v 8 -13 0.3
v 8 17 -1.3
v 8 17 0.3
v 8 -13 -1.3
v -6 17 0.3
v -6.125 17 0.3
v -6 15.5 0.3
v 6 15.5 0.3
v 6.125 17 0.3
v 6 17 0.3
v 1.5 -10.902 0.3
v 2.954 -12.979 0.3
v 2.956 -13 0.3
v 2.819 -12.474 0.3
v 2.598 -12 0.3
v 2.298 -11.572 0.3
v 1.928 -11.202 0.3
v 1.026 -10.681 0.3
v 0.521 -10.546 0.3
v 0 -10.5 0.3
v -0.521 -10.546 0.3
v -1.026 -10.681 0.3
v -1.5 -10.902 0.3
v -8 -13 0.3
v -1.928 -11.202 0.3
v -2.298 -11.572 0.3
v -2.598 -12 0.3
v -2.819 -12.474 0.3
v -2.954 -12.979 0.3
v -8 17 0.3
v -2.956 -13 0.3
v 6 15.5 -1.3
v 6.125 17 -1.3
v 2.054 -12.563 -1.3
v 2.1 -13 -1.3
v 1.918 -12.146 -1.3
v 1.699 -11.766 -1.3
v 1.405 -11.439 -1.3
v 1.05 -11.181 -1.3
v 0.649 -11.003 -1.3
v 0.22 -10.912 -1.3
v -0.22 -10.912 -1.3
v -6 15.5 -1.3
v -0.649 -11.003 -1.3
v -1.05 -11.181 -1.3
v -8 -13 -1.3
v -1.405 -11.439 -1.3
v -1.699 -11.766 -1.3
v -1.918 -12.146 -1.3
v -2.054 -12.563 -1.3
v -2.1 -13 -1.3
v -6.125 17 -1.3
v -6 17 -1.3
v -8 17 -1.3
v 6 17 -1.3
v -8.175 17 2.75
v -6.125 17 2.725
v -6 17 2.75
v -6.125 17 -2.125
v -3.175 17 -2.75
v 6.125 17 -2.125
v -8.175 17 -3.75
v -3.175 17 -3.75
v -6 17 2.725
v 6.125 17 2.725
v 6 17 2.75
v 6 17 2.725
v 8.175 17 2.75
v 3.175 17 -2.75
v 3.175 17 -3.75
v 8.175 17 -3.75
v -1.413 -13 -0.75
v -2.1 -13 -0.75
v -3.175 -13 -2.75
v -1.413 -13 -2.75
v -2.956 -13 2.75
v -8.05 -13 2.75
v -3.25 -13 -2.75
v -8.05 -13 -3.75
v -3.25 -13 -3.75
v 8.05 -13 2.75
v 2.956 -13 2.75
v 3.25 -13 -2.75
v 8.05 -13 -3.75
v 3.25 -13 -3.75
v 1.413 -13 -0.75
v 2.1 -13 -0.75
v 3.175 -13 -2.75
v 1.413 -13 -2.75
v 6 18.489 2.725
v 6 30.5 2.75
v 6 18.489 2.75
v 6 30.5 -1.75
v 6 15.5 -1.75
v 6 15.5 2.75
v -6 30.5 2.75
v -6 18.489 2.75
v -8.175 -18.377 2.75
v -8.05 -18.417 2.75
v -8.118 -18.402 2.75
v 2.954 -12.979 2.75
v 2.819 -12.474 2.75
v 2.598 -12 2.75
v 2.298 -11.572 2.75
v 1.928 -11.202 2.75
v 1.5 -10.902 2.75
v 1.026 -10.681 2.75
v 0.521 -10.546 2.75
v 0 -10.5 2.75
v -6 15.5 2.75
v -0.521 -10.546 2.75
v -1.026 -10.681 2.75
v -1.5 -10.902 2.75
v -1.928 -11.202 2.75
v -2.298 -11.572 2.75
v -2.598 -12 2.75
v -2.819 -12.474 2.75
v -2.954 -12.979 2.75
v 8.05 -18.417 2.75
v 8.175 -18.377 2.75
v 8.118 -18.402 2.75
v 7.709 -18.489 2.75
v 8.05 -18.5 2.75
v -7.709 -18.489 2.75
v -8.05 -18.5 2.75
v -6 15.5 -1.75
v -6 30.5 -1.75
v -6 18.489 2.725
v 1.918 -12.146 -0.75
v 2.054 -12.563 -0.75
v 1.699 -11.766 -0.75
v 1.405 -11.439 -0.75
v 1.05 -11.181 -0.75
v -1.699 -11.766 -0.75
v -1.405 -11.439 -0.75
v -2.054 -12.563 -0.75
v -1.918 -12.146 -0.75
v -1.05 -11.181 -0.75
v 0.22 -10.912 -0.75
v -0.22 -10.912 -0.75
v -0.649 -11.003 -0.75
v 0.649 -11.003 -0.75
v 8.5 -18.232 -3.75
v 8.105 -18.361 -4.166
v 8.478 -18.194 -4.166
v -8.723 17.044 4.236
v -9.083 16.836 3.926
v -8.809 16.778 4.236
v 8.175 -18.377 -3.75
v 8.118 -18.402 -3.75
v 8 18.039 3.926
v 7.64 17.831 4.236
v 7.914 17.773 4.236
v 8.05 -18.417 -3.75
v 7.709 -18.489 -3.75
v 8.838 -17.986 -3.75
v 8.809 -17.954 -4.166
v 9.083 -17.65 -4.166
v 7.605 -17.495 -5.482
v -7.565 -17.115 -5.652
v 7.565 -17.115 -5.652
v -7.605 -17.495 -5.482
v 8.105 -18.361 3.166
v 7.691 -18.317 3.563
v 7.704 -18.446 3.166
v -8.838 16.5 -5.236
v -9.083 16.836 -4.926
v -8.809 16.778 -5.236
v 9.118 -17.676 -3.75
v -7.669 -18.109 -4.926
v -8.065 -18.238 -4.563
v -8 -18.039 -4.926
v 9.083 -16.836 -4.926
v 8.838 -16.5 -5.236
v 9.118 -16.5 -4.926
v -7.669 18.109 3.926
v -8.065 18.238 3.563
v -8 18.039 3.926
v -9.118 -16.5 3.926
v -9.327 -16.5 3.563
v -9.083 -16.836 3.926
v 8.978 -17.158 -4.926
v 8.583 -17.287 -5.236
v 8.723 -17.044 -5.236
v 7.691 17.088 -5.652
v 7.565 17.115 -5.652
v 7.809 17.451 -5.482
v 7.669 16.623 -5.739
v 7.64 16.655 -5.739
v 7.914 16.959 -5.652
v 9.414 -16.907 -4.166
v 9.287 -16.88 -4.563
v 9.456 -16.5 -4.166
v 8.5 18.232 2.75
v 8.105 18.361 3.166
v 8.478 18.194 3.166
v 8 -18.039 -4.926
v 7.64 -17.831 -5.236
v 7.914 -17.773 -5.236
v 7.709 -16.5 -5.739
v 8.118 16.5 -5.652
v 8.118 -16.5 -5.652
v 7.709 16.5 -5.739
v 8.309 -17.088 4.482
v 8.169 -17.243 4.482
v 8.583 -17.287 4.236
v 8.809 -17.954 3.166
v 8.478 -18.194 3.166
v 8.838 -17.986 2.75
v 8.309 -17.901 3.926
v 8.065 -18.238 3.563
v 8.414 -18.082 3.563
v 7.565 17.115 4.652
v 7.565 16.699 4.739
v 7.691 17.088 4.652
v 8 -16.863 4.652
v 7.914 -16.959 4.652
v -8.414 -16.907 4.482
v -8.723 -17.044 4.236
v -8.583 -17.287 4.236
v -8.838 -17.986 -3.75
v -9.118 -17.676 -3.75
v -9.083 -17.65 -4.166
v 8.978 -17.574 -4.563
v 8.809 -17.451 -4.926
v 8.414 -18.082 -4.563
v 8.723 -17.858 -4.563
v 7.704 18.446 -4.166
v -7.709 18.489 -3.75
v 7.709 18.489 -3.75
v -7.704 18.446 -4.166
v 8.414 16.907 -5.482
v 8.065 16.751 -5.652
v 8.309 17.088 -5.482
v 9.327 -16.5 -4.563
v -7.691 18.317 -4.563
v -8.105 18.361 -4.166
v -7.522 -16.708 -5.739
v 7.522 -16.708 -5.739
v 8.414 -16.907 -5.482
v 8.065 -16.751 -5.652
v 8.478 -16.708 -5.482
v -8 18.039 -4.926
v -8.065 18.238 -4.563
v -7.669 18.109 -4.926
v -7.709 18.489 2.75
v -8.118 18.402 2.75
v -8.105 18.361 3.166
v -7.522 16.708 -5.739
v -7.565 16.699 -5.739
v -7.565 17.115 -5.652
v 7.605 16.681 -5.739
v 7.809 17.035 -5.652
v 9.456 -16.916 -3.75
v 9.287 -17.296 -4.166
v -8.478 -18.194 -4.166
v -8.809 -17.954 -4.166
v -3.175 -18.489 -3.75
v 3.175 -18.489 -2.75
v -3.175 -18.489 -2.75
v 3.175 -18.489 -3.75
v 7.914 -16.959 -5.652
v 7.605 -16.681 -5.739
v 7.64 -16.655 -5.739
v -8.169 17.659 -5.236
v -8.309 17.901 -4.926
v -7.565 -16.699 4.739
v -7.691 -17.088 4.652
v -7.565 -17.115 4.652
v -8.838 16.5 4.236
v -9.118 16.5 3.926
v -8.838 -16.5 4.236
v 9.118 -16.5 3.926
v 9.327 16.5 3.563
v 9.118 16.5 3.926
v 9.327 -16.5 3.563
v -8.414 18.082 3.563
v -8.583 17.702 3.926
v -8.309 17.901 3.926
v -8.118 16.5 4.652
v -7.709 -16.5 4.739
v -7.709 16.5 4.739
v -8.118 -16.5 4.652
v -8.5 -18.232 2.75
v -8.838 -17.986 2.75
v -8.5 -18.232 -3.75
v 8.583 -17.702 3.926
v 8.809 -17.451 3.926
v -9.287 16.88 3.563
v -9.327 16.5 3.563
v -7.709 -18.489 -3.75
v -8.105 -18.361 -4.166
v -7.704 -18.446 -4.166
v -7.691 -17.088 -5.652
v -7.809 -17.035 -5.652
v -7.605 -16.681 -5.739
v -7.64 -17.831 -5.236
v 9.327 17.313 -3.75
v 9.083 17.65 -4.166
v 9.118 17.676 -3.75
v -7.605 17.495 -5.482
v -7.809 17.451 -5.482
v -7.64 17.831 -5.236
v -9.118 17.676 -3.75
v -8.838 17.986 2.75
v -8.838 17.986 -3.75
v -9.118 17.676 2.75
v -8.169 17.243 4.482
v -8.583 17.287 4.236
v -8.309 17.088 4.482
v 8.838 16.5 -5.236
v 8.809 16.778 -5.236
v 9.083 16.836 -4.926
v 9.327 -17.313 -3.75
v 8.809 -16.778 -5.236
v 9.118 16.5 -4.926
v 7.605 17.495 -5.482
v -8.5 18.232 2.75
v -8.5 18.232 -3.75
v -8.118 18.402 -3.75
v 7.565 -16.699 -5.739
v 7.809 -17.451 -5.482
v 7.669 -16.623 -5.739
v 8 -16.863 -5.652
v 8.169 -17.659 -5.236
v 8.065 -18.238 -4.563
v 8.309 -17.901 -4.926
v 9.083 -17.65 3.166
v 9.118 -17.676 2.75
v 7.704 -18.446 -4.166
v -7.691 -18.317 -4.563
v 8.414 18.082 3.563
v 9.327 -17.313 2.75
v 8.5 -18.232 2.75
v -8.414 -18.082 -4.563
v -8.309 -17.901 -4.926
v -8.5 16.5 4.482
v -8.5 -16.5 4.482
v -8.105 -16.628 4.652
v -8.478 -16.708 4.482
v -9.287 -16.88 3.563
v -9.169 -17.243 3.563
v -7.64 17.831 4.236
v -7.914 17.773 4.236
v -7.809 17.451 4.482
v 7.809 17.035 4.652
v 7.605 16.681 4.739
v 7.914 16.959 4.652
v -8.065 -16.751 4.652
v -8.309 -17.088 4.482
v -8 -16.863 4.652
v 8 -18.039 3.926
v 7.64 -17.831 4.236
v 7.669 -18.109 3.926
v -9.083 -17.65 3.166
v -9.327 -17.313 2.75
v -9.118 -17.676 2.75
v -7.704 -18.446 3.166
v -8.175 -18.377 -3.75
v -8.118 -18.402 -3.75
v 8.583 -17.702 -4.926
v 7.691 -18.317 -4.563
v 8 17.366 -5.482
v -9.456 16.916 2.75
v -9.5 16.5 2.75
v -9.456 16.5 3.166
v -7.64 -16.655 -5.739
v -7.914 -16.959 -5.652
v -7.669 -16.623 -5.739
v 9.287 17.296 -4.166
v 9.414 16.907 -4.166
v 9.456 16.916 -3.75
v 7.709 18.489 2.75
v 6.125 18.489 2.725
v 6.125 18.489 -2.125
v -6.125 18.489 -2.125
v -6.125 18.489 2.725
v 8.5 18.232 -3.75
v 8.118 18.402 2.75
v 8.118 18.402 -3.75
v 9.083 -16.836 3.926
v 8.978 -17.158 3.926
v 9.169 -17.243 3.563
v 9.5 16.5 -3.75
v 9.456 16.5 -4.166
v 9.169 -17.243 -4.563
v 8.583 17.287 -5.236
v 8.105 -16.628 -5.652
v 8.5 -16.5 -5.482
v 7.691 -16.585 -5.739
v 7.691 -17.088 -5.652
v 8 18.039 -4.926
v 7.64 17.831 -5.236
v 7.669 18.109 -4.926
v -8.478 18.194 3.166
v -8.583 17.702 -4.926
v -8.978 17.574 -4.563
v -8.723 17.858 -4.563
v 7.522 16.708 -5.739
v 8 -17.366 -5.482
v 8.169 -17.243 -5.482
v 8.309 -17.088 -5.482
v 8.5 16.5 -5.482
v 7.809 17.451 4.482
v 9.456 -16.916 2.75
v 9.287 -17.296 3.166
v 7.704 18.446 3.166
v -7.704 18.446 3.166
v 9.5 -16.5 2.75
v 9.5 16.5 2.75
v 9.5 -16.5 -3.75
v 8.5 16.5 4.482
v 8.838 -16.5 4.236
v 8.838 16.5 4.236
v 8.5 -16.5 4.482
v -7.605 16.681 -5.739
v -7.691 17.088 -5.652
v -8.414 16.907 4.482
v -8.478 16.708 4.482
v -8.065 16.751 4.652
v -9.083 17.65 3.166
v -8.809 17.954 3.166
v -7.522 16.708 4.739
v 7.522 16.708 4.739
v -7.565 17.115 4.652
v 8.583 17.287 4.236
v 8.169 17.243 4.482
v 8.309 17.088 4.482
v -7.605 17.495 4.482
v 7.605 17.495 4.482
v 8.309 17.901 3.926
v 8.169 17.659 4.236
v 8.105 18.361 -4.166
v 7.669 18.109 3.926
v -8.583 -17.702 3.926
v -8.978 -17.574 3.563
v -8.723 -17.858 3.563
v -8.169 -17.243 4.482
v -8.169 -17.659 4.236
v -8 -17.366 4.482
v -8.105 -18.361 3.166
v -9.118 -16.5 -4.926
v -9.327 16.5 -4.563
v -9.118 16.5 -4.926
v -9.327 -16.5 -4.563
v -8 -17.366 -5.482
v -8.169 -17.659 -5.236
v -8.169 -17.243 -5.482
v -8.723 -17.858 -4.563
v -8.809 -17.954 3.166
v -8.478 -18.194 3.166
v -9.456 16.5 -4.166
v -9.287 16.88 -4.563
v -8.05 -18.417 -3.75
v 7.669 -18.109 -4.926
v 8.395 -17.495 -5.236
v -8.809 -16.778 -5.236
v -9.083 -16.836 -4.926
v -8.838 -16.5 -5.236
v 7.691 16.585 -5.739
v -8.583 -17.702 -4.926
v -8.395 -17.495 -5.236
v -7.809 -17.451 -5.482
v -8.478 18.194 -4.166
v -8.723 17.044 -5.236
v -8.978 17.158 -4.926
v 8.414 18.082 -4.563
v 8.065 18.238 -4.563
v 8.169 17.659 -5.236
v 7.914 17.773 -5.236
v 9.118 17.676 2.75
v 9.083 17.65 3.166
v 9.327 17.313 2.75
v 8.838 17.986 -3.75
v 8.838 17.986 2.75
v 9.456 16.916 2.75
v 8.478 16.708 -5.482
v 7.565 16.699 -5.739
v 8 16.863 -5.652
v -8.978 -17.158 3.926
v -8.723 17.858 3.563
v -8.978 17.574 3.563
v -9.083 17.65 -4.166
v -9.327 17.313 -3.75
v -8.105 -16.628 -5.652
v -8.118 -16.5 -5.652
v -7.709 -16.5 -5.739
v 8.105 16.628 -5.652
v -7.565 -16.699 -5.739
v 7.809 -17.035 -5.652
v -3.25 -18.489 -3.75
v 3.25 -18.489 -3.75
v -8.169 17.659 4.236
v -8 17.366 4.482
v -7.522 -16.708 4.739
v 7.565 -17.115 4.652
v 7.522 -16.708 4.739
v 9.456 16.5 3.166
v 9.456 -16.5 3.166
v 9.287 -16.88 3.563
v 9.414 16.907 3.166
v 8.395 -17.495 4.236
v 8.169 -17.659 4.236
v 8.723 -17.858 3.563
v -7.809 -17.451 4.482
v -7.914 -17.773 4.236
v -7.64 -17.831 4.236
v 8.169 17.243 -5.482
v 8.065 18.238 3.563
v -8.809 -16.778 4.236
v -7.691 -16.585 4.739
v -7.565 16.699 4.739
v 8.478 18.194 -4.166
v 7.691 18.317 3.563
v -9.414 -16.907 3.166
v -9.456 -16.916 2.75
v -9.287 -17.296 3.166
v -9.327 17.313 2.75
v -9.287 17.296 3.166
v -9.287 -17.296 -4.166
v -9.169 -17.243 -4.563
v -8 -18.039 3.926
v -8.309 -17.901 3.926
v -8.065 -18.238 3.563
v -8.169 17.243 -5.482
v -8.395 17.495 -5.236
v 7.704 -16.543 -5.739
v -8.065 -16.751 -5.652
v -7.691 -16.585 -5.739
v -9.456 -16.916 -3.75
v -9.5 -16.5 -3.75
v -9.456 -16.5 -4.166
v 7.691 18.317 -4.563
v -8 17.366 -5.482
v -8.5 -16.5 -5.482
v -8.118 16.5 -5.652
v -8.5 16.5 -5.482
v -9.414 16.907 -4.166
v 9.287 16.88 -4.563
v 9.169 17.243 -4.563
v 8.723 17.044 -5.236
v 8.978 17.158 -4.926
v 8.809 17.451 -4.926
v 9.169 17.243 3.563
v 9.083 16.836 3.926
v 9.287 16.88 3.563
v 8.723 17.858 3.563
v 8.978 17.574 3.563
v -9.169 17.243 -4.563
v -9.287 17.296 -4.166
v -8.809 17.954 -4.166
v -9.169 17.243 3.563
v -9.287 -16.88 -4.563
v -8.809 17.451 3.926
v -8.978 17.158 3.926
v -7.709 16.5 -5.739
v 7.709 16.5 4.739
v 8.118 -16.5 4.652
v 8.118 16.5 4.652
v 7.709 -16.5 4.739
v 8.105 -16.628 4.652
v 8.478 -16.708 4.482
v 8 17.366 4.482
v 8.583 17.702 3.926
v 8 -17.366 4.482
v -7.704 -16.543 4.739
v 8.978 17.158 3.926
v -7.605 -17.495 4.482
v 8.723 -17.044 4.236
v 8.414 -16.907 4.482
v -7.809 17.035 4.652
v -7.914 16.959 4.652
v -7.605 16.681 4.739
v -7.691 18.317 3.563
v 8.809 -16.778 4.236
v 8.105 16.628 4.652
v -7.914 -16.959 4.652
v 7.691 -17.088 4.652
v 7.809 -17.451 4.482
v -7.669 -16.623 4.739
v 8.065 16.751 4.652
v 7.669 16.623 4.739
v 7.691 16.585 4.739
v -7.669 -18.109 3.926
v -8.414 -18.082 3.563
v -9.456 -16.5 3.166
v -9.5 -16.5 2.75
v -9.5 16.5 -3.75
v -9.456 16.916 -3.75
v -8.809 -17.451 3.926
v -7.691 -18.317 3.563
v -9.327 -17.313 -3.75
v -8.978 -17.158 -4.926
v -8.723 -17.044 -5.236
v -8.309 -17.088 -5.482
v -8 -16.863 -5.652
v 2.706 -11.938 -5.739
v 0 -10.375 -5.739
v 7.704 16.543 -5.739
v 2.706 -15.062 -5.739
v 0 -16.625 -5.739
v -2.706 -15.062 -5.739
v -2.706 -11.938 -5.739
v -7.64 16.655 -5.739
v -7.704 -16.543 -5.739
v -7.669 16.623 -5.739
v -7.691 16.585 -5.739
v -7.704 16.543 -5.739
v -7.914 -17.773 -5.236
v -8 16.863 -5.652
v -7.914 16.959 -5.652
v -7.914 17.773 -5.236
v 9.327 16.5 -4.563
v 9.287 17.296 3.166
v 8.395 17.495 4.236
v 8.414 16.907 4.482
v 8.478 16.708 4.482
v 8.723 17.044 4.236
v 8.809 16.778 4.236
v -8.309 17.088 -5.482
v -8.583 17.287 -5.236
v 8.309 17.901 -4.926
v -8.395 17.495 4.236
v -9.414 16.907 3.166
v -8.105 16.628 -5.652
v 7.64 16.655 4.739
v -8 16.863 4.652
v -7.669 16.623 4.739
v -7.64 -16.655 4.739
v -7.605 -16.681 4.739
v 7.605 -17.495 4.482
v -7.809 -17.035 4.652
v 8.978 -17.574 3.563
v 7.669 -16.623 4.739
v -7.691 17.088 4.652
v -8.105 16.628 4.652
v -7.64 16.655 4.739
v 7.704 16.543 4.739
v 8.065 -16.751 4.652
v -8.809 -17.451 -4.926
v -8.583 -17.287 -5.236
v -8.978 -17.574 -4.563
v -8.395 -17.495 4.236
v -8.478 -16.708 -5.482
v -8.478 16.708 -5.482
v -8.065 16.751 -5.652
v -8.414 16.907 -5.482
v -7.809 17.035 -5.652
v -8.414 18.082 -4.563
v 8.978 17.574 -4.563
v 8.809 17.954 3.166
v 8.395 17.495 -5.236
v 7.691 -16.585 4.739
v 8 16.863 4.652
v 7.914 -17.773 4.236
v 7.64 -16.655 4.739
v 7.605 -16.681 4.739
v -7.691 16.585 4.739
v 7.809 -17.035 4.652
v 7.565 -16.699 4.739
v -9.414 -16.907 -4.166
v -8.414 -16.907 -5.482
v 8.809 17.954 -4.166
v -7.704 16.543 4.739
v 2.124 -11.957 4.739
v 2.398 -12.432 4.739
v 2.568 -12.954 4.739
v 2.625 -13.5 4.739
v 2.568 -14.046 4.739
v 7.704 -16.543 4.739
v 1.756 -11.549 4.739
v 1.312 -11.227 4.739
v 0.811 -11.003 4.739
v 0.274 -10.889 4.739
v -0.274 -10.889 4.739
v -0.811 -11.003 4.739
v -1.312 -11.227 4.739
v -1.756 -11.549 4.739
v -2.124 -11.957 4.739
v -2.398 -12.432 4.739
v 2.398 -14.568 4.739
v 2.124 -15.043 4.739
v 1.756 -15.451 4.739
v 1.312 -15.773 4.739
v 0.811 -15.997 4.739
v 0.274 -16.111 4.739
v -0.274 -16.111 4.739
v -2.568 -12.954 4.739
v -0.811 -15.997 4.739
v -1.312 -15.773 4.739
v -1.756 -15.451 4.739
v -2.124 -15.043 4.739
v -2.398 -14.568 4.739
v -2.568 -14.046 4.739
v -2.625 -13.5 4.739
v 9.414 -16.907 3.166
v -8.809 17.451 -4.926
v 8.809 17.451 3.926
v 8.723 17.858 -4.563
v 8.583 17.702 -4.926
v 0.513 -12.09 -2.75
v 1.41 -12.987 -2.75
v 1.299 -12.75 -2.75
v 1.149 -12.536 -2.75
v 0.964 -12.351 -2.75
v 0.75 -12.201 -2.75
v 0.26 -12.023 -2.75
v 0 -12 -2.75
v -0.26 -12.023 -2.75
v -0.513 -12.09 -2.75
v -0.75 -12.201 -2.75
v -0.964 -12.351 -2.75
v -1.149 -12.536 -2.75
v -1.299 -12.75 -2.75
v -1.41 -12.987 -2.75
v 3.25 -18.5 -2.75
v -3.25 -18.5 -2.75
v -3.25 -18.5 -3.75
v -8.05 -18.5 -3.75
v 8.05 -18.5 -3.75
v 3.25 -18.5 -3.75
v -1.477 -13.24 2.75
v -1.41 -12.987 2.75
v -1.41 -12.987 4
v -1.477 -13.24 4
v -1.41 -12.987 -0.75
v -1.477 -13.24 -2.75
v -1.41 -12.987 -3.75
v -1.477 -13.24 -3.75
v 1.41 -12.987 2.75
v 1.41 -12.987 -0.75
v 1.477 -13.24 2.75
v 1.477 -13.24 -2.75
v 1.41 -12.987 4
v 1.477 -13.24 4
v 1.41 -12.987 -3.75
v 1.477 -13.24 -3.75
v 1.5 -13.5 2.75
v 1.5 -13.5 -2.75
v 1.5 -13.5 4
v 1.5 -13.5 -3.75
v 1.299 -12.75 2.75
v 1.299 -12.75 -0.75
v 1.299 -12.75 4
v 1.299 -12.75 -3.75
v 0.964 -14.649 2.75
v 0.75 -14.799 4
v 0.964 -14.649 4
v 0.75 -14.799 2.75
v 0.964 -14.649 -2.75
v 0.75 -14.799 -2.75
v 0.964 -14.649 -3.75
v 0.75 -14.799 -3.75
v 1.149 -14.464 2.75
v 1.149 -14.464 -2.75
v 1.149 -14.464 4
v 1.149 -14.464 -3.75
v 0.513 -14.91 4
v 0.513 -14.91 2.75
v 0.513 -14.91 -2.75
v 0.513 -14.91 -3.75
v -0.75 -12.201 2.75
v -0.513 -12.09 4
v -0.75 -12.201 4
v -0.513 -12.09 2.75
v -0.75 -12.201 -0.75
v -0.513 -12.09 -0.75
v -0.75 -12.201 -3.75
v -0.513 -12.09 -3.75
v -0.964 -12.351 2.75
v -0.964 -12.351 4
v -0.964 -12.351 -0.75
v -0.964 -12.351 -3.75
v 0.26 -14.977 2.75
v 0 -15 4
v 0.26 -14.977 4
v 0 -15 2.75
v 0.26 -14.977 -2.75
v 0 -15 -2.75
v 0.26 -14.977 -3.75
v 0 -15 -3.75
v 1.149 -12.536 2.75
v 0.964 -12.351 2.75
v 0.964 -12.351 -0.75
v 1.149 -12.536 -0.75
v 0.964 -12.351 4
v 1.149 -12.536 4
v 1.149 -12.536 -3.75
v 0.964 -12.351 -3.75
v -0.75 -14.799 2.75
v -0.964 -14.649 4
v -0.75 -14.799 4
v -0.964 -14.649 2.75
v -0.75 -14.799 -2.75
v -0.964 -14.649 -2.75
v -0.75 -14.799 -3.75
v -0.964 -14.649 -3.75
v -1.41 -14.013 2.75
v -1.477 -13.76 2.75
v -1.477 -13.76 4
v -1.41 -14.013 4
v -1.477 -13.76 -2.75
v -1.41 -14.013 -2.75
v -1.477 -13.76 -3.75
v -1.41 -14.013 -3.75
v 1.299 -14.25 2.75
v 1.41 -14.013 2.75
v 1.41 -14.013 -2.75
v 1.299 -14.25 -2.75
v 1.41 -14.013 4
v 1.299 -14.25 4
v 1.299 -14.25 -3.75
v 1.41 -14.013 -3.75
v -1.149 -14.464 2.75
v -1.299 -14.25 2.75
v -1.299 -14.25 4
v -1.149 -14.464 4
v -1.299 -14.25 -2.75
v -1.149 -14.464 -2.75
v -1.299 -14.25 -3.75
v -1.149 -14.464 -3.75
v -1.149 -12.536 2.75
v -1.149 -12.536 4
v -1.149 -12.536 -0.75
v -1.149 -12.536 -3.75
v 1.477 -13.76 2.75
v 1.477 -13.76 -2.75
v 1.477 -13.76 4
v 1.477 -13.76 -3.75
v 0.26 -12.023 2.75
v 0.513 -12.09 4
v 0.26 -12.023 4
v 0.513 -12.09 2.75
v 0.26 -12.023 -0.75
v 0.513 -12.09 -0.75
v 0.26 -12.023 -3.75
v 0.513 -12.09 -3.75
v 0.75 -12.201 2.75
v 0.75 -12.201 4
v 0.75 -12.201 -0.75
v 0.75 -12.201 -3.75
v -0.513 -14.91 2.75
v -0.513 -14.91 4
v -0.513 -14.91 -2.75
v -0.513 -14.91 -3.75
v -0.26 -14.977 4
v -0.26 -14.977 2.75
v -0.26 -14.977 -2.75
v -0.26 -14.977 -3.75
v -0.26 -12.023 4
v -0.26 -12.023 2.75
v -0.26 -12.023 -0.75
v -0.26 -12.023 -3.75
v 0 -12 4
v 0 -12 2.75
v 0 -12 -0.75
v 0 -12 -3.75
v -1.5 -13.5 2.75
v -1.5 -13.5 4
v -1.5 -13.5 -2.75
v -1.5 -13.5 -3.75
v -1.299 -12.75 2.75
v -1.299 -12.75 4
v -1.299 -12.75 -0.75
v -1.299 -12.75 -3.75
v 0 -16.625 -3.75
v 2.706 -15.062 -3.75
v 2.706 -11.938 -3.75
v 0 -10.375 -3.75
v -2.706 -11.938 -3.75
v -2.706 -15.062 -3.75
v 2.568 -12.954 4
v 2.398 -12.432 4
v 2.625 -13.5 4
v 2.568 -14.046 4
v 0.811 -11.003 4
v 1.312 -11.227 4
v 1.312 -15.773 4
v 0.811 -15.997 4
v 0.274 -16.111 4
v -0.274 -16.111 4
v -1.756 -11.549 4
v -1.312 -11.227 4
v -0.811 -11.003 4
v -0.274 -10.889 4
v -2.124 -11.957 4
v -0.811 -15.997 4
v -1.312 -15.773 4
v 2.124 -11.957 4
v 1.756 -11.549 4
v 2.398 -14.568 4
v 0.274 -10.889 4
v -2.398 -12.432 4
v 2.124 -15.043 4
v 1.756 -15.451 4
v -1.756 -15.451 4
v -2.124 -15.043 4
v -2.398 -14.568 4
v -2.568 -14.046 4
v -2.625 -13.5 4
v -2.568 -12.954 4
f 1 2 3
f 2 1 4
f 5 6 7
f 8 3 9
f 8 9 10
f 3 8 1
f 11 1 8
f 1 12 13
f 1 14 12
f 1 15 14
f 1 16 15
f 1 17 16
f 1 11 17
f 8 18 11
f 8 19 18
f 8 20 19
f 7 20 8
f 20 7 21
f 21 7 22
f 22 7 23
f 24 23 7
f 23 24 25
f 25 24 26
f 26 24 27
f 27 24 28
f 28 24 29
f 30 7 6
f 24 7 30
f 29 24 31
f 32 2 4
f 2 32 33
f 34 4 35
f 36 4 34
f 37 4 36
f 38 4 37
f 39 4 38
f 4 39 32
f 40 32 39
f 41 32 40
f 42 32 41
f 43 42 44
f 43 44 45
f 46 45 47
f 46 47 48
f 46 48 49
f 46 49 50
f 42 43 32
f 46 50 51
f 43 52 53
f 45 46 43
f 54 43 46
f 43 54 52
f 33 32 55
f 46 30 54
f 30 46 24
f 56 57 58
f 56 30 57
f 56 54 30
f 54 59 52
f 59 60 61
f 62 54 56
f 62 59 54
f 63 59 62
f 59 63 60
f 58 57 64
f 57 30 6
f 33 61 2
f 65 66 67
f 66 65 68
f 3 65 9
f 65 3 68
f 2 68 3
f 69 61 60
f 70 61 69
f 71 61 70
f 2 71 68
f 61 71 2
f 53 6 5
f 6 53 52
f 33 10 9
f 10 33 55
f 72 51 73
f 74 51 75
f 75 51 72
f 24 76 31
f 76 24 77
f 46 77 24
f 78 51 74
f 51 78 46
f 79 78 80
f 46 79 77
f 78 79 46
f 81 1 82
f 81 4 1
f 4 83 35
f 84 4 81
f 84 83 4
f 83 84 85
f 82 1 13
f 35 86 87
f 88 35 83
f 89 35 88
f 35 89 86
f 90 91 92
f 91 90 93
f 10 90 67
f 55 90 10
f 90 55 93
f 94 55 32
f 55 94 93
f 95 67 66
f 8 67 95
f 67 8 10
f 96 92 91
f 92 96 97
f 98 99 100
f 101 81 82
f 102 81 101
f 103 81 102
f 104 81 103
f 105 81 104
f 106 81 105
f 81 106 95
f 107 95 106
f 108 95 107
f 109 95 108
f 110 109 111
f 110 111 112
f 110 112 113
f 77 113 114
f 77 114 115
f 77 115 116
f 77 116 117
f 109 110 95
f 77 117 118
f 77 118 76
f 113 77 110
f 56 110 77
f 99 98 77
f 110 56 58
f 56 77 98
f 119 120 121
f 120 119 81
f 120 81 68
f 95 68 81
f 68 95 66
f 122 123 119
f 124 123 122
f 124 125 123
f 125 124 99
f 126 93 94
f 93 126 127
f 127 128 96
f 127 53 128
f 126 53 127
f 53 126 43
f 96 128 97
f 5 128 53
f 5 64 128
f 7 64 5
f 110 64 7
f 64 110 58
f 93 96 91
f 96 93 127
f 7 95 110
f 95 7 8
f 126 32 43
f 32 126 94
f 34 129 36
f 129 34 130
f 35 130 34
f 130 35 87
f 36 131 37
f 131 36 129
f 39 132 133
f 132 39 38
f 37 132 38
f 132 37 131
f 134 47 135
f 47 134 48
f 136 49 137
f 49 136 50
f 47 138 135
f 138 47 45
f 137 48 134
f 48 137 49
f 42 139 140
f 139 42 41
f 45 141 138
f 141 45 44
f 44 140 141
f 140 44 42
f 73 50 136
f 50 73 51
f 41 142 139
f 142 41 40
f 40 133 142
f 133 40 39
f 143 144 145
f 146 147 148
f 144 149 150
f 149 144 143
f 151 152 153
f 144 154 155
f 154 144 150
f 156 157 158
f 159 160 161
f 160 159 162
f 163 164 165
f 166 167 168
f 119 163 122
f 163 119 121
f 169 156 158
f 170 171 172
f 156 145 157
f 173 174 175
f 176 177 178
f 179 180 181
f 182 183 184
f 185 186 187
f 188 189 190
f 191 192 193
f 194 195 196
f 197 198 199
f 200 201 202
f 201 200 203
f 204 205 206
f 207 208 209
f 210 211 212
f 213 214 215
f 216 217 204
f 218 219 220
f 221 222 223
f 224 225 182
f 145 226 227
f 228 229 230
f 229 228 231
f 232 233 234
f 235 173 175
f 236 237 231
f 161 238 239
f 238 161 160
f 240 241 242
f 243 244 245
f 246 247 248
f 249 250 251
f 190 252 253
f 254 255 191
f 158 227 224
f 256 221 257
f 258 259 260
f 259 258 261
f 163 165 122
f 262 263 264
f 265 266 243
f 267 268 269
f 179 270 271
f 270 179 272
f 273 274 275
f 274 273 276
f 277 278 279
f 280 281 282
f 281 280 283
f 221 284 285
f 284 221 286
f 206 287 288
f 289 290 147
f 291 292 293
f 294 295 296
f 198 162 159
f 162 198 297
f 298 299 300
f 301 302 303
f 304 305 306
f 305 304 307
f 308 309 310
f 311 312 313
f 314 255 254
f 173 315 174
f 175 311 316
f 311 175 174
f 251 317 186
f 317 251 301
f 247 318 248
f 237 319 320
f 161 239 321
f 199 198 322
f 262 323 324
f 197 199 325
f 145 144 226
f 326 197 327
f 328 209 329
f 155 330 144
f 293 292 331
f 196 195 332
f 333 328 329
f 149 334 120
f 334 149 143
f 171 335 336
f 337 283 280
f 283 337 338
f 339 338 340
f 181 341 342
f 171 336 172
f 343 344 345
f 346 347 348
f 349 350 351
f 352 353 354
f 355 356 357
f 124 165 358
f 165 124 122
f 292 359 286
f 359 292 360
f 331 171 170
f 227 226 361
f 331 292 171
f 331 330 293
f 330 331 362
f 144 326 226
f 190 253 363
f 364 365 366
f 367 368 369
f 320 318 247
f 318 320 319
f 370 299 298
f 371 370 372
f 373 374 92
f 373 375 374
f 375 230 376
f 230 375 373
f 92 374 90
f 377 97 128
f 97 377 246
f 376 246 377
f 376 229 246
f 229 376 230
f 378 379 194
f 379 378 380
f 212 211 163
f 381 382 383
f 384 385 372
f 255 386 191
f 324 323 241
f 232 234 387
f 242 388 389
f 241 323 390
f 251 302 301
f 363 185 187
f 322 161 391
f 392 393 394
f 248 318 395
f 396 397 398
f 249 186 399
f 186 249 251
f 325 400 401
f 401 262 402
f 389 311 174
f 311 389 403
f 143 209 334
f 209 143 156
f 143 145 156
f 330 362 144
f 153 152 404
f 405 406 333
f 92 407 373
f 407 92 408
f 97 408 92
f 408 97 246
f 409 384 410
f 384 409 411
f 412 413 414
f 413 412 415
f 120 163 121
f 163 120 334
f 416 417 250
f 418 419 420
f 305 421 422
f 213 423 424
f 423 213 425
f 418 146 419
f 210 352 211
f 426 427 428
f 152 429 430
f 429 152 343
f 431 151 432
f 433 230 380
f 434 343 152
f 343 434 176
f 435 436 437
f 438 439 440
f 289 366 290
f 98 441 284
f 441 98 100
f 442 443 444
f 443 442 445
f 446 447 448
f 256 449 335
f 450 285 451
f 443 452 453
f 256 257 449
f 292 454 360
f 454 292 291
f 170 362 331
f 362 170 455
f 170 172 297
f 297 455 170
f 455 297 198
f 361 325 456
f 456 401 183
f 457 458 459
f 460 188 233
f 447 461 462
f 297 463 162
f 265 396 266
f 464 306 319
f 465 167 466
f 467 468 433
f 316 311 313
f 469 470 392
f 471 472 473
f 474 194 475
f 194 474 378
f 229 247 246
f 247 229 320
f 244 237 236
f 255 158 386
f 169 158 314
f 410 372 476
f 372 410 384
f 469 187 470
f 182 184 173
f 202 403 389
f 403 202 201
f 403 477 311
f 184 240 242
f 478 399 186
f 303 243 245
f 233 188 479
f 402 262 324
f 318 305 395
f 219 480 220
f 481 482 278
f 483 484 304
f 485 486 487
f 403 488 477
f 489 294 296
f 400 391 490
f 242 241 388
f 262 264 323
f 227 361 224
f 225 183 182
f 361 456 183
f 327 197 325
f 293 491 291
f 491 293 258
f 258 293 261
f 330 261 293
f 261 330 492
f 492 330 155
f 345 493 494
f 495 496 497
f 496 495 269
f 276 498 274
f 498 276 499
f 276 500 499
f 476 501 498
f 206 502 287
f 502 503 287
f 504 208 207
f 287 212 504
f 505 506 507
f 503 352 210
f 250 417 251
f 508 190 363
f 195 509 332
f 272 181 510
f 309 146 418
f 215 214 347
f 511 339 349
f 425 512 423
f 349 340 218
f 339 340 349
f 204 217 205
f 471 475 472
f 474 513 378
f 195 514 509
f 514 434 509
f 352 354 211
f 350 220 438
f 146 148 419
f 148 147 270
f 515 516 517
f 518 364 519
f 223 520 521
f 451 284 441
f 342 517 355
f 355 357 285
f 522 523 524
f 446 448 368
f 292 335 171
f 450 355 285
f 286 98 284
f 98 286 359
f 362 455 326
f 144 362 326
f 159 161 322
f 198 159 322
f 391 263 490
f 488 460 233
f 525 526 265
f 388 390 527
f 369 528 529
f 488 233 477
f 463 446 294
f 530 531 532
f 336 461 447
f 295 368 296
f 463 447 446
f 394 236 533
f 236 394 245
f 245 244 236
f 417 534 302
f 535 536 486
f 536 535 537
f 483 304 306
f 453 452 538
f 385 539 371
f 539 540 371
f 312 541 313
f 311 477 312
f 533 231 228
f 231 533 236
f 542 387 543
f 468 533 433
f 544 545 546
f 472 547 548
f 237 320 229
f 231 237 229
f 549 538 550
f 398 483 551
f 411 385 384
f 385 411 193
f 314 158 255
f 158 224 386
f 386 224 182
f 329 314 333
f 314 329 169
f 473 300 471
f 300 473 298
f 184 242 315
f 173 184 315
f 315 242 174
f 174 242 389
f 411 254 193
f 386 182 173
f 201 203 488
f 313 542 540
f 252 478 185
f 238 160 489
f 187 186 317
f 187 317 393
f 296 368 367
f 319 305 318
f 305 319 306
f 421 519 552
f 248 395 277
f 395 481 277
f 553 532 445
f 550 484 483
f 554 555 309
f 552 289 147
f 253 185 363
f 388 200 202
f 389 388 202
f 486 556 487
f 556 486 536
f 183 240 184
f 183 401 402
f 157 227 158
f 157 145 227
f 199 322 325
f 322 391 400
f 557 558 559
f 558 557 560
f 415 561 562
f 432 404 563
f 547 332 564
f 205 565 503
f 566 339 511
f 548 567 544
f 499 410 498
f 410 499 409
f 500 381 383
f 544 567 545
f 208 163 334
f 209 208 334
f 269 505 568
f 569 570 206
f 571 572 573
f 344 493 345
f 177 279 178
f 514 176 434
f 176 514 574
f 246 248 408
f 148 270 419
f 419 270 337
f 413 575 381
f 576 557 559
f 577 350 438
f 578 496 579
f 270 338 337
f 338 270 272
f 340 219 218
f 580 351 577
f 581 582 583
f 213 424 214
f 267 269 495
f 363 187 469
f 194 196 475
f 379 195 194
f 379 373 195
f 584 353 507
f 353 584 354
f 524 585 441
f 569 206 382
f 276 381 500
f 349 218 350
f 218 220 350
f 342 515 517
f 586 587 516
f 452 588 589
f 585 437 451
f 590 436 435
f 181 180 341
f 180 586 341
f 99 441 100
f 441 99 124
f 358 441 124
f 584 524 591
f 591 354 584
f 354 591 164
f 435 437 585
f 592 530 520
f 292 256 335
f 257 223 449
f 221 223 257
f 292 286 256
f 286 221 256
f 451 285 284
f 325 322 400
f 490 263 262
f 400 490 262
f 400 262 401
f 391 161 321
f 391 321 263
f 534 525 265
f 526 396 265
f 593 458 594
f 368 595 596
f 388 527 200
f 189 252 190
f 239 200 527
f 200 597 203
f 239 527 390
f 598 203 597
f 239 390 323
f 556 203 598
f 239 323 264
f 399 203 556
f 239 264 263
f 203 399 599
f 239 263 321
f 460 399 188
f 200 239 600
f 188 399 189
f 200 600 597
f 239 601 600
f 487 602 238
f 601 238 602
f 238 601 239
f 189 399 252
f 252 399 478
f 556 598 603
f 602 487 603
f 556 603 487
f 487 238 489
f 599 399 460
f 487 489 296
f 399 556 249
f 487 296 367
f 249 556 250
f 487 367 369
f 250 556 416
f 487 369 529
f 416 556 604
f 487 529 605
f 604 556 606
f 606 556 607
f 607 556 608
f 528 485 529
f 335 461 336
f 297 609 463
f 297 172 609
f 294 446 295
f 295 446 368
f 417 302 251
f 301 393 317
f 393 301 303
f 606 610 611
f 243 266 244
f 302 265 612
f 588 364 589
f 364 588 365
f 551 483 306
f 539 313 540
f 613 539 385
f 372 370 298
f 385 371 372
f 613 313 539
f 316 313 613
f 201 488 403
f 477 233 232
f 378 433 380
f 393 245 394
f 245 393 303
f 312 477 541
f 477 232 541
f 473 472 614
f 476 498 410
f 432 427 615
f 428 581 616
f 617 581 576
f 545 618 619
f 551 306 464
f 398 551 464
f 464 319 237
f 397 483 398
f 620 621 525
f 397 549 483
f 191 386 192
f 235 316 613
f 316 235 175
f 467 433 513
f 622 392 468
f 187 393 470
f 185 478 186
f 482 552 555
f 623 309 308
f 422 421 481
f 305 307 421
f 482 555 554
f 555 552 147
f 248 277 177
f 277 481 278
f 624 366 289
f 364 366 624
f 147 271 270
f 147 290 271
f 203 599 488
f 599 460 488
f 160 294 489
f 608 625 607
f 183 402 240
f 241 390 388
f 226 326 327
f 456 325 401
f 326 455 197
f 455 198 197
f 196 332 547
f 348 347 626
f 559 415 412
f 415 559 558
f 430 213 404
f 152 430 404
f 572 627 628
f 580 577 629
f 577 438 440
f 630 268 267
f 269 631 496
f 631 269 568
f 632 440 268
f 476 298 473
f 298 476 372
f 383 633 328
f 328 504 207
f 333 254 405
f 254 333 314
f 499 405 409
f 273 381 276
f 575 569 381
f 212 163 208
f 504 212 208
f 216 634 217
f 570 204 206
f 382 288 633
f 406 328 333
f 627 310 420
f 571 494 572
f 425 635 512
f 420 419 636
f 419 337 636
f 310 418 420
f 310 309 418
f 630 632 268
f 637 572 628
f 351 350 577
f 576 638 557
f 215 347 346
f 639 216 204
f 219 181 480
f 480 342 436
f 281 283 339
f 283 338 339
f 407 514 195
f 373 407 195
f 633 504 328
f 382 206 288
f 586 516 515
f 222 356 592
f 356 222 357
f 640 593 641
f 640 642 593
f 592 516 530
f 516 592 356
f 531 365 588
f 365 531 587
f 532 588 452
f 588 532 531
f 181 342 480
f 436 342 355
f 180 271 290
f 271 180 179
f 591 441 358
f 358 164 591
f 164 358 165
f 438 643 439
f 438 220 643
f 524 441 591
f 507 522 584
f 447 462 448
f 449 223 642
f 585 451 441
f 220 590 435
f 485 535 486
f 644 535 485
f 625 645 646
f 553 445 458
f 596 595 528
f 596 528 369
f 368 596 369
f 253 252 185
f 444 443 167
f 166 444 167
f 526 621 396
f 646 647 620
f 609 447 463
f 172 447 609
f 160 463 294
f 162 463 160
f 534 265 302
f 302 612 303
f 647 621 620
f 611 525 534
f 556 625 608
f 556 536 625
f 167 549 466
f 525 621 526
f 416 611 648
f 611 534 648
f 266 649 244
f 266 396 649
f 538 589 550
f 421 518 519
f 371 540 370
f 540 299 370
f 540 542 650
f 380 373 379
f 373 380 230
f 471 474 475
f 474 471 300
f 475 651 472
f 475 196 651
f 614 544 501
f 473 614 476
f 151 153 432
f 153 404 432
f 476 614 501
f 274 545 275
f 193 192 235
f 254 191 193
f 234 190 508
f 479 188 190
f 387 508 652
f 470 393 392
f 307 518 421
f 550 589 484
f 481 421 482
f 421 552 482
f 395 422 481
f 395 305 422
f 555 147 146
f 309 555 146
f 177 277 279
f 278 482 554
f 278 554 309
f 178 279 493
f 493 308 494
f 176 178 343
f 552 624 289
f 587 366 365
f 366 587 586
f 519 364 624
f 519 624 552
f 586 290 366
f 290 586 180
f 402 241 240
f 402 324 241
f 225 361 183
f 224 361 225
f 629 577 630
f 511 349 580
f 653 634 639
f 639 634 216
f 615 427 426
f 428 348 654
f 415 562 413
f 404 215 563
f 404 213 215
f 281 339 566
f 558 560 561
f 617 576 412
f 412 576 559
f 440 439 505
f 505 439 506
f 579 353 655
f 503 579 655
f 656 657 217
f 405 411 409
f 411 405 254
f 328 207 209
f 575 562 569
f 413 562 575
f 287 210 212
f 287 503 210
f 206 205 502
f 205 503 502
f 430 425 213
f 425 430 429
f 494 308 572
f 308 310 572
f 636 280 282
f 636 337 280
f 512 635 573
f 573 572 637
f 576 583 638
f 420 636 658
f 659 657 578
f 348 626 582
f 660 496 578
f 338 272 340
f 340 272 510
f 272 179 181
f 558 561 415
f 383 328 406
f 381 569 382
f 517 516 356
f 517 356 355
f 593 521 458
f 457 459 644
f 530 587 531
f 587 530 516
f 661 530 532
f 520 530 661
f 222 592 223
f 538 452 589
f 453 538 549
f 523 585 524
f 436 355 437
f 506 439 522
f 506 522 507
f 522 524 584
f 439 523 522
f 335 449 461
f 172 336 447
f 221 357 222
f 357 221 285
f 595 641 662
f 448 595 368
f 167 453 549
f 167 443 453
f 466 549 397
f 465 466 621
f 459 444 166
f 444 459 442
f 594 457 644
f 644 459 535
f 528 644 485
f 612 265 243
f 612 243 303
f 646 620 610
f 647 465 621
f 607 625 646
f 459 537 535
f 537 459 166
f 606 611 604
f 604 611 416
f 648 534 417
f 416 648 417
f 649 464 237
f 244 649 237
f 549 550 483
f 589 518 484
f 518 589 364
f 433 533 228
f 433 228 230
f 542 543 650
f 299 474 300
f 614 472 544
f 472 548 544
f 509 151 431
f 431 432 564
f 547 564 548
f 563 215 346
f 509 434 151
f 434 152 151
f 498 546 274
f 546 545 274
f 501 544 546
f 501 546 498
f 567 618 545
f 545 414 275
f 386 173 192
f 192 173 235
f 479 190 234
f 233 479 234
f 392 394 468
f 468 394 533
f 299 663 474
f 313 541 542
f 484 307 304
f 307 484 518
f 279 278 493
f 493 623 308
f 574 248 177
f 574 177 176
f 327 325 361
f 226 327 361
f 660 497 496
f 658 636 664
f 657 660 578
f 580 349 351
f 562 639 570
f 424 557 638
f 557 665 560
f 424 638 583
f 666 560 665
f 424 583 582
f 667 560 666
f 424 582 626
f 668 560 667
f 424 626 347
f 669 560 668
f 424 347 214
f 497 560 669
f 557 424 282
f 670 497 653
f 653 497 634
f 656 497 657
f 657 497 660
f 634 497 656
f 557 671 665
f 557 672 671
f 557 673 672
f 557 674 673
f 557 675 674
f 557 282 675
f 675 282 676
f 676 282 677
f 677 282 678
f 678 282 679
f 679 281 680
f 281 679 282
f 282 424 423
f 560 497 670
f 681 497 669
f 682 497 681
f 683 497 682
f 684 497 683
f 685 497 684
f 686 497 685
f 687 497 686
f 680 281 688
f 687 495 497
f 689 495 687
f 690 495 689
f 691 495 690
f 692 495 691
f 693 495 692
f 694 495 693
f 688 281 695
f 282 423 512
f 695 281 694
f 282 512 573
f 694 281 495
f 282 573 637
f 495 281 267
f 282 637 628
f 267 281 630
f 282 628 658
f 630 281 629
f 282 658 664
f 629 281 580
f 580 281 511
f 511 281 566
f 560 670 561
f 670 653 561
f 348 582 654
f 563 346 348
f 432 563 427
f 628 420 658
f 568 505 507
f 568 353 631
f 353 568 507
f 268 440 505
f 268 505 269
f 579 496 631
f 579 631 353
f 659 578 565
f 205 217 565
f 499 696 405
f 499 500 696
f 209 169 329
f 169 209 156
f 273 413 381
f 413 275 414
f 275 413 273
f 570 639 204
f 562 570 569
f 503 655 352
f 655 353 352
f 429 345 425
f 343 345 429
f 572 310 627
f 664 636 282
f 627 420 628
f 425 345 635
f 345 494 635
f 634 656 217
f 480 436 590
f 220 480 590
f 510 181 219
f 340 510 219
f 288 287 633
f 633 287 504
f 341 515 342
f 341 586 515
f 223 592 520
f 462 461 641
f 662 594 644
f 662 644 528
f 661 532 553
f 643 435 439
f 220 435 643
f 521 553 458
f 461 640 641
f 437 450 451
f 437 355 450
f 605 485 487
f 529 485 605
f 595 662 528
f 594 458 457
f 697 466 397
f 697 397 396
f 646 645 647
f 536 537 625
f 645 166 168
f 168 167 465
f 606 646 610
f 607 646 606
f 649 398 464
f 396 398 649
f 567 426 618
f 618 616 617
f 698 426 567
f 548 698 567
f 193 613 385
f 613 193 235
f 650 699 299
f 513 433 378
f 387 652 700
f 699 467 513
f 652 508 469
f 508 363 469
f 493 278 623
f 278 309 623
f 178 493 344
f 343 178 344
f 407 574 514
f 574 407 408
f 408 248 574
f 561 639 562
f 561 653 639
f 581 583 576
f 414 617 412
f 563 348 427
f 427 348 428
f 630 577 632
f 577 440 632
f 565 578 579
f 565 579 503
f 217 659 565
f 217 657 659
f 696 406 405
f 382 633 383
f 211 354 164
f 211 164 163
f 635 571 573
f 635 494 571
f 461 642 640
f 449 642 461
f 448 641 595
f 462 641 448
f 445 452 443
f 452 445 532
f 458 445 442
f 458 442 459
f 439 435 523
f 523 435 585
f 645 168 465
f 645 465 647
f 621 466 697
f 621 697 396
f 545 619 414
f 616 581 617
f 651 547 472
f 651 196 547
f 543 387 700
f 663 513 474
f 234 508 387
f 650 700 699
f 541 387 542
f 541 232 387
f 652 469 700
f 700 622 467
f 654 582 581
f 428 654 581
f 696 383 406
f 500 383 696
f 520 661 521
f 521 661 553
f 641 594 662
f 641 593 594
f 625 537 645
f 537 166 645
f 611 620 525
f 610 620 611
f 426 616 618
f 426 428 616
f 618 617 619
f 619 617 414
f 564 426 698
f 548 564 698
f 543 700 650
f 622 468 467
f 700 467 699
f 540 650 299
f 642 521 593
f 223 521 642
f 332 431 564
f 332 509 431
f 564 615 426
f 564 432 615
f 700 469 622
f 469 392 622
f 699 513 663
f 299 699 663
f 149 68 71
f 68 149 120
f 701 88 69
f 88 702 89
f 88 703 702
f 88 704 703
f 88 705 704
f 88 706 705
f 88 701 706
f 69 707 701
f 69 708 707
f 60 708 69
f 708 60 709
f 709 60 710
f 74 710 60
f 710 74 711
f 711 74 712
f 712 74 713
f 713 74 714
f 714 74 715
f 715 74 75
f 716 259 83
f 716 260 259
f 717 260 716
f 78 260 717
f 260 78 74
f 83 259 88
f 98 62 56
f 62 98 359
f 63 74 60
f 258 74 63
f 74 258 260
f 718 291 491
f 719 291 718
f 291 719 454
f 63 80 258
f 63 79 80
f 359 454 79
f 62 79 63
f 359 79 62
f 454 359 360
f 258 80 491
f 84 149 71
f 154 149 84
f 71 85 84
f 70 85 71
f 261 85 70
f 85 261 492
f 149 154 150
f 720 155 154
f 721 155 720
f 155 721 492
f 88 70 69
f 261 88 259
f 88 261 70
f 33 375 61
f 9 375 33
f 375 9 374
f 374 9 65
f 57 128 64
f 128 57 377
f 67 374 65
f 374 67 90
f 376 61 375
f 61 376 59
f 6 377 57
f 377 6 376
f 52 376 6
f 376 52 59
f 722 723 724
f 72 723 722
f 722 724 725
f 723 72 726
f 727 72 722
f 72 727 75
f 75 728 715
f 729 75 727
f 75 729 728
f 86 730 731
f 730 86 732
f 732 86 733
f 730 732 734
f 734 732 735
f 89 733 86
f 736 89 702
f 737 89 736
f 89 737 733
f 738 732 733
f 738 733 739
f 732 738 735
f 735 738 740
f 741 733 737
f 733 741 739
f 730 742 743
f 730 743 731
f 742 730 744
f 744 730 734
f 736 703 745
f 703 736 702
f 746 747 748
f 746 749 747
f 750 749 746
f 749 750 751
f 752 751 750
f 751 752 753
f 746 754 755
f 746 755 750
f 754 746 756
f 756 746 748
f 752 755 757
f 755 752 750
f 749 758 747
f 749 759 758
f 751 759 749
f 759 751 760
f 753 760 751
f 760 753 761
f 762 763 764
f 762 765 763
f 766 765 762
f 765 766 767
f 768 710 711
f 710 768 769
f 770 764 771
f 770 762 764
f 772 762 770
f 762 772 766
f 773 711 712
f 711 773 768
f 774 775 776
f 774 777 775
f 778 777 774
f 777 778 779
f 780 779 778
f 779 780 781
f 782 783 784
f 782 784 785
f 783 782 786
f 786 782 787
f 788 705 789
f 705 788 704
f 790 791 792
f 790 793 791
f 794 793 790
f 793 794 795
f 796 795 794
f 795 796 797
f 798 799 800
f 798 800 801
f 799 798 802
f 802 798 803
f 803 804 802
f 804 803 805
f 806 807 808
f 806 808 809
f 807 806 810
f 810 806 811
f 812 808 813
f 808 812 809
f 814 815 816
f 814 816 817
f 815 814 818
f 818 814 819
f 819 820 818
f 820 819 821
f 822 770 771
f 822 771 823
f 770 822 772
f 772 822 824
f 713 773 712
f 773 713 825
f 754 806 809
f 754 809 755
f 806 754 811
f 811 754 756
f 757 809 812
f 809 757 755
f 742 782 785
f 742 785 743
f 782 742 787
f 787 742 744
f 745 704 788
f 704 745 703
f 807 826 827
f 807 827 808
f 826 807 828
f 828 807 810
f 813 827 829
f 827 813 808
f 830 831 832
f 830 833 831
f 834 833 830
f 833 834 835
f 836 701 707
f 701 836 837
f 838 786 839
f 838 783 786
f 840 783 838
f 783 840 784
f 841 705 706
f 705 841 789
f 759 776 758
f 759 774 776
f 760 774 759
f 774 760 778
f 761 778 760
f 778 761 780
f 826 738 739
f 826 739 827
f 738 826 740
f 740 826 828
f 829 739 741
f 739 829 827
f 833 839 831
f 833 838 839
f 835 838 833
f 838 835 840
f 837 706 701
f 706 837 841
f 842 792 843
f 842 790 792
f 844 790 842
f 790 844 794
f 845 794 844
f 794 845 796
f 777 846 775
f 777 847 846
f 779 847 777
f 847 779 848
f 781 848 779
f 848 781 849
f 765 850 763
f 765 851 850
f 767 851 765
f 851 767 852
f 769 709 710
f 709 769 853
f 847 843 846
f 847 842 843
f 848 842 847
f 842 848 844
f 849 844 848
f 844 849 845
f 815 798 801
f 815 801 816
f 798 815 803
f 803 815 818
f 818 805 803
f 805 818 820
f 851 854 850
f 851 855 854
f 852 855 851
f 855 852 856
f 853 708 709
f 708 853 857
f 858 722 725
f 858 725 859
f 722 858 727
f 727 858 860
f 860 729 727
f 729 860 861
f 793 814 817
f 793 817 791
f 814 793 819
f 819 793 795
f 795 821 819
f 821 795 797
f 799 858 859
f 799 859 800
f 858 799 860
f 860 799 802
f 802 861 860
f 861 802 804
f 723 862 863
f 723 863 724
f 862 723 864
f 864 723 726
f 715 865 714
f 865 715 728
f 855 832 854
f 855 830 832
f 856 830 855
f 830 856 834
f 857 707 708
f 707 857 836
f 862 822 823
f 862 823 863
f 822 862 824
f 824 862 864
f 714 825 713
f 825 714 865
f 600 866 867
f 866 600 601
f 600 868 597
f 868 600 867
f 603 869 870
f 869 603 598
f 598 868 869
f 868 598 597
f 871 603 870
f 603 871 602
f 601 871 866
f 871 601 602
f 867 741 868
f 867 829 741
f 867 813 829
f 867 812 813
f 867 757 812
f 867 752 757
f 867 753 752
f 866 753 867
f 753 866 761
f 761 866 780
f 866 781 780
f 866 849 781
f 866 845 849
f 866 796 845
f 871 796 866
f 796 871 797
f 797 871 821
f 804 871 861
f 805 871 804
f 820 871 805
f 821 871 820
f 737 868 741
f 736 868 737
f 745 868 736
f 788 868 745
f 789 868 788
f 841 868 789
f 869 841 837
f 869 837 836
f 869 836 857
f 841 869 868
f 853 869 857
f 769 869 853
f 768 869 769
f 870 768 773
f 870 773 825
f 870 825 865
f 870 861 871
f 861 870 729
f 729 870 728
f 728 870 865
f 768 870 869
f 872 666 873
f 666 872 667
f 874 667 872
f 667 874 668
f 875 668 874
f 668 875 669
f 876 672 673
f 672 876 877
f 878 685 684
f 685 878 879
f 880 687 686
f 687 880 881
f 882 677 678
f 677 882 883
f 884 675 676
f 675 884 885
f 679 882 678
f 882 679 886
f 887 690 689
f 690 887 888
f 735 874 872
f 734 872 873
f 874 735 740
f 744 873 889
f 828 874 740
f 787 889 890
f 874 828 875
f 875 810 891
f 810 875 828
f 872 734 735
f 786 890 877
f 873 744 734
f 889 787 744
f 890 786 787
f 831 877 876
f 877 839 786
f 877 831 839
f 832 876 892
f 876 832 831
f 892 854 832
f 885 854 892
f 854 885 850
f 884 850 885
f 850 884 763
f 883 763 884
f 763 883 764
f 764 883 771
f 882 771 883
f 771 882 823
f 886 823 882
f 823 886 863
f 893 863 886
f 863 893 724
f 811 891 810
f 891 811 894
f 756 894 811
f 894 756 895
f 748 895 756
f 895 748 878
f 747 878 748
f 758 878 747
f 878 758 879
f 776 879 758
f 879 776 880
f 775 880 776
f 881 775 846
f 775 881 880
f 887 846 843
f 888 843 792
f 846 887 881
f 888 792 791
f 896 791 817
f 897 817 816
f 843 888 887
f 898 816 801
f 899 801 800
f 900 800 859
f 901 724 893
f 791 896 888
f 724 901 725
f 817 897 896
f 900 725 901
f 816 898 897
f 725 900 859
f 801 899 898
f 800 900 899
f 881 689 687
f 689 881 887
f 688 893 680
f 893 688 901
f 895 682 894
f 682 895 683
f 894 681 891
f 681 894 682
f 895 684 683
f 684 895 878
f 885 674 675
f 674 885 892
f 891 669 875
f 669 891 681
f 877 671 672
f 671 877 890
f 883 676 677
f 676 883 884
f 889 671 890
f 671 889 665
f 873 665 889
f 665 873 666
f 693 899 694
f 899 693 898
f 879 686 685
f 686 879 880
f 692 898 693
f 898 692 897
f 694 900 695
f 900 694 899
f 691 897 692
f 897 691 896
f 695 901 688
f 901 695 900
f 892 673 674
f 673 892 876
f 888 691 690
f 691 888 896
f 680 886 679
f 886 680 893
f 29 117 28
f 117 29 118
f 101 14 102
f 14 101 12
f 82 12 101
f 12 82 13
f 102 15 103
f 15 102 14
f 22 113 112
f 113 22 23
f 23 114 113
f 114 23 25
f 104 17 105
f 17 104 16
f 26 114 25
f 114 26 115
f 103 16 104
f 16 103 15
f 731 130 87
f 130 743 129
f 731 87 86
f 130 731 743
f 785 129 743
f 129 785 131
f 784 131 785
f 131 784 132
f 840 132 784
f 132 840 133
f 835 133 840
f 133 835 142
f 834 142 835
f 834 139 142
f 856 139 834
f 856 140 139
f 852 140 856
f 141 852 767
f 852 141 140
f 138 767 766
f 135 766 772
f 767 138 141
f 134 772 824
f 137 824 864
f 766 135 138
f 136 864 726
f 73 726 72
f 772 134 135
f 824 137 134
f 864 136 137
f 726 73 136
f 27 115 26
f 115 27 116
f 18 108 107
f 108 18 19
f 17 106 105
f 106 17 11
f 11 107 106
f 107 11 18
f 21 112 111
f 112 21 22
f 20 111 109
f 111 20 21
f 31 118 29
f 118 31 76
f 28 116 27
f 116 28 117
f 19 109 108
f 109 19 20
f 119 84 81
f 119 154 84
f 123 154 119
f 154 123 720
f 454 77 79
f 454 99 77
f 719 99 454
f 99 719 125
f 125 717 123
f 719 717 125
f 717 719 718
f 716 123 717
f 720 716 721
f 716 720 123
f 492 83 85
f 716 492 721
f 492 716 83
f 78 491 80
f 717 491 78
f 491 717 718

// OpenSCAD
/*
 * Blaustahl Case Neu Edition
 * Copyright (c) 2025 Lone Dynamics Corporation. All rights reserved.
 *
 * required hardware:
 *  - 1 x M2.5 x 10mm countersunk bolt
 *  - 1 x M2.5 nut
 *
 */
 
$fn = 30;

box_width = 19;
box_length = 37;
box_height = 10.5;
box_thickness = 2.0;

lid_thickness = 3;

cutout_width = 16.10;
cutout_length = 44;
cutout_height = 5.5;

cutout_usb_width = 12;

board_height = 1.4;

roundness = 2;

toladj = 0.25;

ldp_board(-0.5);
translate([0,0,-0.5]) ldp_case();
translate([0,0,-0.25]) ldp_endcap();

// m2.5 bolt
//translate([0,-13.5,-6.25]) color([1,0,0]) cylinder(d=2.5, h=12, $fn=36);

// m2.5 nut
//translate([0,-13.5,-6.55]) rotate(30) color([1,0,0]) cylinder(d=5.8, h=2.4, $fn=6);

module ldp_endcap()
{
    		 	
	difference() {
		union() {
			translate([0,-13.5,-0.5]) color([0,0,1]) cylinder(d=6, h=3.5, $fn=36);
			translate([0,-15.75,-0.25]) cube([16.1,5.5,6.5], center=true);
		}
		translate([0,-13.5,-4.25]) color([1,0,0]) cylinder(d=3, h=8, $fn=36);
        color([1,0,0]) translate([0,0,-5.5]) cube([6.5,100,6], center=true);

	}
}

module ldp_board(o)
{

	difference() {
		union() {
			translate([0,2,o])
				color([0.0,0.8,0.0]) cube([16, 30, 1.6], center=true);
			translate([0,23,o+1])
				color([0.9,0.9,0.9]) cube([12, 15, 4.5], center=true);
		}
		translate([0,-13,-10]) cylinder(d=4.2, h=100);

	}
	
}

module ldp_case()
{

	difference() {
		
		minkowski() {
			cube([box_width-(roundness*2),box_length-(roundness*2),box_height-(roundness*2)],
				center=true);
			sphere(roundness);
		}	
        
		translate([0,-5,(box_height-cutout_height)/2-2])
			cube([cutout_width+toladj,cutout_length,cutout_height], center=true);

		translate([-5.675,-5,(box_height-cutout_height)/2-3])
			cube([5,cutout_length,cutout_height], center=true);
		
		translate([5.675,-5,(box_height-cutout_height)/2-3])
			cube([5,cutout_length,cutout_height], center=true);

		// USB cutout
        translate([0,15,0.8])
            cube([cutout_usb_width+toladj,10,4.6+toladj], center=true);
        
		// bolt hole
		translate([0,-13.5,-5]) cylinder(d=2.75+toladj, h=100, $fn=36);
		
		// nut cutout
		translate([0,-13.5,-5.75]) rotate(30) cylinder(d=6+toladj, h=2.5, $fn=6);
    
        // lid notch cutout
        translate([0,-13.5,4.5]) cylinder(d=5+toladj, h=100);

//        translate([-1.5,2.5,5.1]) rotate([0,0,270])
//            linear_extrude(0.3)
//                text("BLAUSTAHL", size=3, halign="center", font="Lato Black");

	}

}
